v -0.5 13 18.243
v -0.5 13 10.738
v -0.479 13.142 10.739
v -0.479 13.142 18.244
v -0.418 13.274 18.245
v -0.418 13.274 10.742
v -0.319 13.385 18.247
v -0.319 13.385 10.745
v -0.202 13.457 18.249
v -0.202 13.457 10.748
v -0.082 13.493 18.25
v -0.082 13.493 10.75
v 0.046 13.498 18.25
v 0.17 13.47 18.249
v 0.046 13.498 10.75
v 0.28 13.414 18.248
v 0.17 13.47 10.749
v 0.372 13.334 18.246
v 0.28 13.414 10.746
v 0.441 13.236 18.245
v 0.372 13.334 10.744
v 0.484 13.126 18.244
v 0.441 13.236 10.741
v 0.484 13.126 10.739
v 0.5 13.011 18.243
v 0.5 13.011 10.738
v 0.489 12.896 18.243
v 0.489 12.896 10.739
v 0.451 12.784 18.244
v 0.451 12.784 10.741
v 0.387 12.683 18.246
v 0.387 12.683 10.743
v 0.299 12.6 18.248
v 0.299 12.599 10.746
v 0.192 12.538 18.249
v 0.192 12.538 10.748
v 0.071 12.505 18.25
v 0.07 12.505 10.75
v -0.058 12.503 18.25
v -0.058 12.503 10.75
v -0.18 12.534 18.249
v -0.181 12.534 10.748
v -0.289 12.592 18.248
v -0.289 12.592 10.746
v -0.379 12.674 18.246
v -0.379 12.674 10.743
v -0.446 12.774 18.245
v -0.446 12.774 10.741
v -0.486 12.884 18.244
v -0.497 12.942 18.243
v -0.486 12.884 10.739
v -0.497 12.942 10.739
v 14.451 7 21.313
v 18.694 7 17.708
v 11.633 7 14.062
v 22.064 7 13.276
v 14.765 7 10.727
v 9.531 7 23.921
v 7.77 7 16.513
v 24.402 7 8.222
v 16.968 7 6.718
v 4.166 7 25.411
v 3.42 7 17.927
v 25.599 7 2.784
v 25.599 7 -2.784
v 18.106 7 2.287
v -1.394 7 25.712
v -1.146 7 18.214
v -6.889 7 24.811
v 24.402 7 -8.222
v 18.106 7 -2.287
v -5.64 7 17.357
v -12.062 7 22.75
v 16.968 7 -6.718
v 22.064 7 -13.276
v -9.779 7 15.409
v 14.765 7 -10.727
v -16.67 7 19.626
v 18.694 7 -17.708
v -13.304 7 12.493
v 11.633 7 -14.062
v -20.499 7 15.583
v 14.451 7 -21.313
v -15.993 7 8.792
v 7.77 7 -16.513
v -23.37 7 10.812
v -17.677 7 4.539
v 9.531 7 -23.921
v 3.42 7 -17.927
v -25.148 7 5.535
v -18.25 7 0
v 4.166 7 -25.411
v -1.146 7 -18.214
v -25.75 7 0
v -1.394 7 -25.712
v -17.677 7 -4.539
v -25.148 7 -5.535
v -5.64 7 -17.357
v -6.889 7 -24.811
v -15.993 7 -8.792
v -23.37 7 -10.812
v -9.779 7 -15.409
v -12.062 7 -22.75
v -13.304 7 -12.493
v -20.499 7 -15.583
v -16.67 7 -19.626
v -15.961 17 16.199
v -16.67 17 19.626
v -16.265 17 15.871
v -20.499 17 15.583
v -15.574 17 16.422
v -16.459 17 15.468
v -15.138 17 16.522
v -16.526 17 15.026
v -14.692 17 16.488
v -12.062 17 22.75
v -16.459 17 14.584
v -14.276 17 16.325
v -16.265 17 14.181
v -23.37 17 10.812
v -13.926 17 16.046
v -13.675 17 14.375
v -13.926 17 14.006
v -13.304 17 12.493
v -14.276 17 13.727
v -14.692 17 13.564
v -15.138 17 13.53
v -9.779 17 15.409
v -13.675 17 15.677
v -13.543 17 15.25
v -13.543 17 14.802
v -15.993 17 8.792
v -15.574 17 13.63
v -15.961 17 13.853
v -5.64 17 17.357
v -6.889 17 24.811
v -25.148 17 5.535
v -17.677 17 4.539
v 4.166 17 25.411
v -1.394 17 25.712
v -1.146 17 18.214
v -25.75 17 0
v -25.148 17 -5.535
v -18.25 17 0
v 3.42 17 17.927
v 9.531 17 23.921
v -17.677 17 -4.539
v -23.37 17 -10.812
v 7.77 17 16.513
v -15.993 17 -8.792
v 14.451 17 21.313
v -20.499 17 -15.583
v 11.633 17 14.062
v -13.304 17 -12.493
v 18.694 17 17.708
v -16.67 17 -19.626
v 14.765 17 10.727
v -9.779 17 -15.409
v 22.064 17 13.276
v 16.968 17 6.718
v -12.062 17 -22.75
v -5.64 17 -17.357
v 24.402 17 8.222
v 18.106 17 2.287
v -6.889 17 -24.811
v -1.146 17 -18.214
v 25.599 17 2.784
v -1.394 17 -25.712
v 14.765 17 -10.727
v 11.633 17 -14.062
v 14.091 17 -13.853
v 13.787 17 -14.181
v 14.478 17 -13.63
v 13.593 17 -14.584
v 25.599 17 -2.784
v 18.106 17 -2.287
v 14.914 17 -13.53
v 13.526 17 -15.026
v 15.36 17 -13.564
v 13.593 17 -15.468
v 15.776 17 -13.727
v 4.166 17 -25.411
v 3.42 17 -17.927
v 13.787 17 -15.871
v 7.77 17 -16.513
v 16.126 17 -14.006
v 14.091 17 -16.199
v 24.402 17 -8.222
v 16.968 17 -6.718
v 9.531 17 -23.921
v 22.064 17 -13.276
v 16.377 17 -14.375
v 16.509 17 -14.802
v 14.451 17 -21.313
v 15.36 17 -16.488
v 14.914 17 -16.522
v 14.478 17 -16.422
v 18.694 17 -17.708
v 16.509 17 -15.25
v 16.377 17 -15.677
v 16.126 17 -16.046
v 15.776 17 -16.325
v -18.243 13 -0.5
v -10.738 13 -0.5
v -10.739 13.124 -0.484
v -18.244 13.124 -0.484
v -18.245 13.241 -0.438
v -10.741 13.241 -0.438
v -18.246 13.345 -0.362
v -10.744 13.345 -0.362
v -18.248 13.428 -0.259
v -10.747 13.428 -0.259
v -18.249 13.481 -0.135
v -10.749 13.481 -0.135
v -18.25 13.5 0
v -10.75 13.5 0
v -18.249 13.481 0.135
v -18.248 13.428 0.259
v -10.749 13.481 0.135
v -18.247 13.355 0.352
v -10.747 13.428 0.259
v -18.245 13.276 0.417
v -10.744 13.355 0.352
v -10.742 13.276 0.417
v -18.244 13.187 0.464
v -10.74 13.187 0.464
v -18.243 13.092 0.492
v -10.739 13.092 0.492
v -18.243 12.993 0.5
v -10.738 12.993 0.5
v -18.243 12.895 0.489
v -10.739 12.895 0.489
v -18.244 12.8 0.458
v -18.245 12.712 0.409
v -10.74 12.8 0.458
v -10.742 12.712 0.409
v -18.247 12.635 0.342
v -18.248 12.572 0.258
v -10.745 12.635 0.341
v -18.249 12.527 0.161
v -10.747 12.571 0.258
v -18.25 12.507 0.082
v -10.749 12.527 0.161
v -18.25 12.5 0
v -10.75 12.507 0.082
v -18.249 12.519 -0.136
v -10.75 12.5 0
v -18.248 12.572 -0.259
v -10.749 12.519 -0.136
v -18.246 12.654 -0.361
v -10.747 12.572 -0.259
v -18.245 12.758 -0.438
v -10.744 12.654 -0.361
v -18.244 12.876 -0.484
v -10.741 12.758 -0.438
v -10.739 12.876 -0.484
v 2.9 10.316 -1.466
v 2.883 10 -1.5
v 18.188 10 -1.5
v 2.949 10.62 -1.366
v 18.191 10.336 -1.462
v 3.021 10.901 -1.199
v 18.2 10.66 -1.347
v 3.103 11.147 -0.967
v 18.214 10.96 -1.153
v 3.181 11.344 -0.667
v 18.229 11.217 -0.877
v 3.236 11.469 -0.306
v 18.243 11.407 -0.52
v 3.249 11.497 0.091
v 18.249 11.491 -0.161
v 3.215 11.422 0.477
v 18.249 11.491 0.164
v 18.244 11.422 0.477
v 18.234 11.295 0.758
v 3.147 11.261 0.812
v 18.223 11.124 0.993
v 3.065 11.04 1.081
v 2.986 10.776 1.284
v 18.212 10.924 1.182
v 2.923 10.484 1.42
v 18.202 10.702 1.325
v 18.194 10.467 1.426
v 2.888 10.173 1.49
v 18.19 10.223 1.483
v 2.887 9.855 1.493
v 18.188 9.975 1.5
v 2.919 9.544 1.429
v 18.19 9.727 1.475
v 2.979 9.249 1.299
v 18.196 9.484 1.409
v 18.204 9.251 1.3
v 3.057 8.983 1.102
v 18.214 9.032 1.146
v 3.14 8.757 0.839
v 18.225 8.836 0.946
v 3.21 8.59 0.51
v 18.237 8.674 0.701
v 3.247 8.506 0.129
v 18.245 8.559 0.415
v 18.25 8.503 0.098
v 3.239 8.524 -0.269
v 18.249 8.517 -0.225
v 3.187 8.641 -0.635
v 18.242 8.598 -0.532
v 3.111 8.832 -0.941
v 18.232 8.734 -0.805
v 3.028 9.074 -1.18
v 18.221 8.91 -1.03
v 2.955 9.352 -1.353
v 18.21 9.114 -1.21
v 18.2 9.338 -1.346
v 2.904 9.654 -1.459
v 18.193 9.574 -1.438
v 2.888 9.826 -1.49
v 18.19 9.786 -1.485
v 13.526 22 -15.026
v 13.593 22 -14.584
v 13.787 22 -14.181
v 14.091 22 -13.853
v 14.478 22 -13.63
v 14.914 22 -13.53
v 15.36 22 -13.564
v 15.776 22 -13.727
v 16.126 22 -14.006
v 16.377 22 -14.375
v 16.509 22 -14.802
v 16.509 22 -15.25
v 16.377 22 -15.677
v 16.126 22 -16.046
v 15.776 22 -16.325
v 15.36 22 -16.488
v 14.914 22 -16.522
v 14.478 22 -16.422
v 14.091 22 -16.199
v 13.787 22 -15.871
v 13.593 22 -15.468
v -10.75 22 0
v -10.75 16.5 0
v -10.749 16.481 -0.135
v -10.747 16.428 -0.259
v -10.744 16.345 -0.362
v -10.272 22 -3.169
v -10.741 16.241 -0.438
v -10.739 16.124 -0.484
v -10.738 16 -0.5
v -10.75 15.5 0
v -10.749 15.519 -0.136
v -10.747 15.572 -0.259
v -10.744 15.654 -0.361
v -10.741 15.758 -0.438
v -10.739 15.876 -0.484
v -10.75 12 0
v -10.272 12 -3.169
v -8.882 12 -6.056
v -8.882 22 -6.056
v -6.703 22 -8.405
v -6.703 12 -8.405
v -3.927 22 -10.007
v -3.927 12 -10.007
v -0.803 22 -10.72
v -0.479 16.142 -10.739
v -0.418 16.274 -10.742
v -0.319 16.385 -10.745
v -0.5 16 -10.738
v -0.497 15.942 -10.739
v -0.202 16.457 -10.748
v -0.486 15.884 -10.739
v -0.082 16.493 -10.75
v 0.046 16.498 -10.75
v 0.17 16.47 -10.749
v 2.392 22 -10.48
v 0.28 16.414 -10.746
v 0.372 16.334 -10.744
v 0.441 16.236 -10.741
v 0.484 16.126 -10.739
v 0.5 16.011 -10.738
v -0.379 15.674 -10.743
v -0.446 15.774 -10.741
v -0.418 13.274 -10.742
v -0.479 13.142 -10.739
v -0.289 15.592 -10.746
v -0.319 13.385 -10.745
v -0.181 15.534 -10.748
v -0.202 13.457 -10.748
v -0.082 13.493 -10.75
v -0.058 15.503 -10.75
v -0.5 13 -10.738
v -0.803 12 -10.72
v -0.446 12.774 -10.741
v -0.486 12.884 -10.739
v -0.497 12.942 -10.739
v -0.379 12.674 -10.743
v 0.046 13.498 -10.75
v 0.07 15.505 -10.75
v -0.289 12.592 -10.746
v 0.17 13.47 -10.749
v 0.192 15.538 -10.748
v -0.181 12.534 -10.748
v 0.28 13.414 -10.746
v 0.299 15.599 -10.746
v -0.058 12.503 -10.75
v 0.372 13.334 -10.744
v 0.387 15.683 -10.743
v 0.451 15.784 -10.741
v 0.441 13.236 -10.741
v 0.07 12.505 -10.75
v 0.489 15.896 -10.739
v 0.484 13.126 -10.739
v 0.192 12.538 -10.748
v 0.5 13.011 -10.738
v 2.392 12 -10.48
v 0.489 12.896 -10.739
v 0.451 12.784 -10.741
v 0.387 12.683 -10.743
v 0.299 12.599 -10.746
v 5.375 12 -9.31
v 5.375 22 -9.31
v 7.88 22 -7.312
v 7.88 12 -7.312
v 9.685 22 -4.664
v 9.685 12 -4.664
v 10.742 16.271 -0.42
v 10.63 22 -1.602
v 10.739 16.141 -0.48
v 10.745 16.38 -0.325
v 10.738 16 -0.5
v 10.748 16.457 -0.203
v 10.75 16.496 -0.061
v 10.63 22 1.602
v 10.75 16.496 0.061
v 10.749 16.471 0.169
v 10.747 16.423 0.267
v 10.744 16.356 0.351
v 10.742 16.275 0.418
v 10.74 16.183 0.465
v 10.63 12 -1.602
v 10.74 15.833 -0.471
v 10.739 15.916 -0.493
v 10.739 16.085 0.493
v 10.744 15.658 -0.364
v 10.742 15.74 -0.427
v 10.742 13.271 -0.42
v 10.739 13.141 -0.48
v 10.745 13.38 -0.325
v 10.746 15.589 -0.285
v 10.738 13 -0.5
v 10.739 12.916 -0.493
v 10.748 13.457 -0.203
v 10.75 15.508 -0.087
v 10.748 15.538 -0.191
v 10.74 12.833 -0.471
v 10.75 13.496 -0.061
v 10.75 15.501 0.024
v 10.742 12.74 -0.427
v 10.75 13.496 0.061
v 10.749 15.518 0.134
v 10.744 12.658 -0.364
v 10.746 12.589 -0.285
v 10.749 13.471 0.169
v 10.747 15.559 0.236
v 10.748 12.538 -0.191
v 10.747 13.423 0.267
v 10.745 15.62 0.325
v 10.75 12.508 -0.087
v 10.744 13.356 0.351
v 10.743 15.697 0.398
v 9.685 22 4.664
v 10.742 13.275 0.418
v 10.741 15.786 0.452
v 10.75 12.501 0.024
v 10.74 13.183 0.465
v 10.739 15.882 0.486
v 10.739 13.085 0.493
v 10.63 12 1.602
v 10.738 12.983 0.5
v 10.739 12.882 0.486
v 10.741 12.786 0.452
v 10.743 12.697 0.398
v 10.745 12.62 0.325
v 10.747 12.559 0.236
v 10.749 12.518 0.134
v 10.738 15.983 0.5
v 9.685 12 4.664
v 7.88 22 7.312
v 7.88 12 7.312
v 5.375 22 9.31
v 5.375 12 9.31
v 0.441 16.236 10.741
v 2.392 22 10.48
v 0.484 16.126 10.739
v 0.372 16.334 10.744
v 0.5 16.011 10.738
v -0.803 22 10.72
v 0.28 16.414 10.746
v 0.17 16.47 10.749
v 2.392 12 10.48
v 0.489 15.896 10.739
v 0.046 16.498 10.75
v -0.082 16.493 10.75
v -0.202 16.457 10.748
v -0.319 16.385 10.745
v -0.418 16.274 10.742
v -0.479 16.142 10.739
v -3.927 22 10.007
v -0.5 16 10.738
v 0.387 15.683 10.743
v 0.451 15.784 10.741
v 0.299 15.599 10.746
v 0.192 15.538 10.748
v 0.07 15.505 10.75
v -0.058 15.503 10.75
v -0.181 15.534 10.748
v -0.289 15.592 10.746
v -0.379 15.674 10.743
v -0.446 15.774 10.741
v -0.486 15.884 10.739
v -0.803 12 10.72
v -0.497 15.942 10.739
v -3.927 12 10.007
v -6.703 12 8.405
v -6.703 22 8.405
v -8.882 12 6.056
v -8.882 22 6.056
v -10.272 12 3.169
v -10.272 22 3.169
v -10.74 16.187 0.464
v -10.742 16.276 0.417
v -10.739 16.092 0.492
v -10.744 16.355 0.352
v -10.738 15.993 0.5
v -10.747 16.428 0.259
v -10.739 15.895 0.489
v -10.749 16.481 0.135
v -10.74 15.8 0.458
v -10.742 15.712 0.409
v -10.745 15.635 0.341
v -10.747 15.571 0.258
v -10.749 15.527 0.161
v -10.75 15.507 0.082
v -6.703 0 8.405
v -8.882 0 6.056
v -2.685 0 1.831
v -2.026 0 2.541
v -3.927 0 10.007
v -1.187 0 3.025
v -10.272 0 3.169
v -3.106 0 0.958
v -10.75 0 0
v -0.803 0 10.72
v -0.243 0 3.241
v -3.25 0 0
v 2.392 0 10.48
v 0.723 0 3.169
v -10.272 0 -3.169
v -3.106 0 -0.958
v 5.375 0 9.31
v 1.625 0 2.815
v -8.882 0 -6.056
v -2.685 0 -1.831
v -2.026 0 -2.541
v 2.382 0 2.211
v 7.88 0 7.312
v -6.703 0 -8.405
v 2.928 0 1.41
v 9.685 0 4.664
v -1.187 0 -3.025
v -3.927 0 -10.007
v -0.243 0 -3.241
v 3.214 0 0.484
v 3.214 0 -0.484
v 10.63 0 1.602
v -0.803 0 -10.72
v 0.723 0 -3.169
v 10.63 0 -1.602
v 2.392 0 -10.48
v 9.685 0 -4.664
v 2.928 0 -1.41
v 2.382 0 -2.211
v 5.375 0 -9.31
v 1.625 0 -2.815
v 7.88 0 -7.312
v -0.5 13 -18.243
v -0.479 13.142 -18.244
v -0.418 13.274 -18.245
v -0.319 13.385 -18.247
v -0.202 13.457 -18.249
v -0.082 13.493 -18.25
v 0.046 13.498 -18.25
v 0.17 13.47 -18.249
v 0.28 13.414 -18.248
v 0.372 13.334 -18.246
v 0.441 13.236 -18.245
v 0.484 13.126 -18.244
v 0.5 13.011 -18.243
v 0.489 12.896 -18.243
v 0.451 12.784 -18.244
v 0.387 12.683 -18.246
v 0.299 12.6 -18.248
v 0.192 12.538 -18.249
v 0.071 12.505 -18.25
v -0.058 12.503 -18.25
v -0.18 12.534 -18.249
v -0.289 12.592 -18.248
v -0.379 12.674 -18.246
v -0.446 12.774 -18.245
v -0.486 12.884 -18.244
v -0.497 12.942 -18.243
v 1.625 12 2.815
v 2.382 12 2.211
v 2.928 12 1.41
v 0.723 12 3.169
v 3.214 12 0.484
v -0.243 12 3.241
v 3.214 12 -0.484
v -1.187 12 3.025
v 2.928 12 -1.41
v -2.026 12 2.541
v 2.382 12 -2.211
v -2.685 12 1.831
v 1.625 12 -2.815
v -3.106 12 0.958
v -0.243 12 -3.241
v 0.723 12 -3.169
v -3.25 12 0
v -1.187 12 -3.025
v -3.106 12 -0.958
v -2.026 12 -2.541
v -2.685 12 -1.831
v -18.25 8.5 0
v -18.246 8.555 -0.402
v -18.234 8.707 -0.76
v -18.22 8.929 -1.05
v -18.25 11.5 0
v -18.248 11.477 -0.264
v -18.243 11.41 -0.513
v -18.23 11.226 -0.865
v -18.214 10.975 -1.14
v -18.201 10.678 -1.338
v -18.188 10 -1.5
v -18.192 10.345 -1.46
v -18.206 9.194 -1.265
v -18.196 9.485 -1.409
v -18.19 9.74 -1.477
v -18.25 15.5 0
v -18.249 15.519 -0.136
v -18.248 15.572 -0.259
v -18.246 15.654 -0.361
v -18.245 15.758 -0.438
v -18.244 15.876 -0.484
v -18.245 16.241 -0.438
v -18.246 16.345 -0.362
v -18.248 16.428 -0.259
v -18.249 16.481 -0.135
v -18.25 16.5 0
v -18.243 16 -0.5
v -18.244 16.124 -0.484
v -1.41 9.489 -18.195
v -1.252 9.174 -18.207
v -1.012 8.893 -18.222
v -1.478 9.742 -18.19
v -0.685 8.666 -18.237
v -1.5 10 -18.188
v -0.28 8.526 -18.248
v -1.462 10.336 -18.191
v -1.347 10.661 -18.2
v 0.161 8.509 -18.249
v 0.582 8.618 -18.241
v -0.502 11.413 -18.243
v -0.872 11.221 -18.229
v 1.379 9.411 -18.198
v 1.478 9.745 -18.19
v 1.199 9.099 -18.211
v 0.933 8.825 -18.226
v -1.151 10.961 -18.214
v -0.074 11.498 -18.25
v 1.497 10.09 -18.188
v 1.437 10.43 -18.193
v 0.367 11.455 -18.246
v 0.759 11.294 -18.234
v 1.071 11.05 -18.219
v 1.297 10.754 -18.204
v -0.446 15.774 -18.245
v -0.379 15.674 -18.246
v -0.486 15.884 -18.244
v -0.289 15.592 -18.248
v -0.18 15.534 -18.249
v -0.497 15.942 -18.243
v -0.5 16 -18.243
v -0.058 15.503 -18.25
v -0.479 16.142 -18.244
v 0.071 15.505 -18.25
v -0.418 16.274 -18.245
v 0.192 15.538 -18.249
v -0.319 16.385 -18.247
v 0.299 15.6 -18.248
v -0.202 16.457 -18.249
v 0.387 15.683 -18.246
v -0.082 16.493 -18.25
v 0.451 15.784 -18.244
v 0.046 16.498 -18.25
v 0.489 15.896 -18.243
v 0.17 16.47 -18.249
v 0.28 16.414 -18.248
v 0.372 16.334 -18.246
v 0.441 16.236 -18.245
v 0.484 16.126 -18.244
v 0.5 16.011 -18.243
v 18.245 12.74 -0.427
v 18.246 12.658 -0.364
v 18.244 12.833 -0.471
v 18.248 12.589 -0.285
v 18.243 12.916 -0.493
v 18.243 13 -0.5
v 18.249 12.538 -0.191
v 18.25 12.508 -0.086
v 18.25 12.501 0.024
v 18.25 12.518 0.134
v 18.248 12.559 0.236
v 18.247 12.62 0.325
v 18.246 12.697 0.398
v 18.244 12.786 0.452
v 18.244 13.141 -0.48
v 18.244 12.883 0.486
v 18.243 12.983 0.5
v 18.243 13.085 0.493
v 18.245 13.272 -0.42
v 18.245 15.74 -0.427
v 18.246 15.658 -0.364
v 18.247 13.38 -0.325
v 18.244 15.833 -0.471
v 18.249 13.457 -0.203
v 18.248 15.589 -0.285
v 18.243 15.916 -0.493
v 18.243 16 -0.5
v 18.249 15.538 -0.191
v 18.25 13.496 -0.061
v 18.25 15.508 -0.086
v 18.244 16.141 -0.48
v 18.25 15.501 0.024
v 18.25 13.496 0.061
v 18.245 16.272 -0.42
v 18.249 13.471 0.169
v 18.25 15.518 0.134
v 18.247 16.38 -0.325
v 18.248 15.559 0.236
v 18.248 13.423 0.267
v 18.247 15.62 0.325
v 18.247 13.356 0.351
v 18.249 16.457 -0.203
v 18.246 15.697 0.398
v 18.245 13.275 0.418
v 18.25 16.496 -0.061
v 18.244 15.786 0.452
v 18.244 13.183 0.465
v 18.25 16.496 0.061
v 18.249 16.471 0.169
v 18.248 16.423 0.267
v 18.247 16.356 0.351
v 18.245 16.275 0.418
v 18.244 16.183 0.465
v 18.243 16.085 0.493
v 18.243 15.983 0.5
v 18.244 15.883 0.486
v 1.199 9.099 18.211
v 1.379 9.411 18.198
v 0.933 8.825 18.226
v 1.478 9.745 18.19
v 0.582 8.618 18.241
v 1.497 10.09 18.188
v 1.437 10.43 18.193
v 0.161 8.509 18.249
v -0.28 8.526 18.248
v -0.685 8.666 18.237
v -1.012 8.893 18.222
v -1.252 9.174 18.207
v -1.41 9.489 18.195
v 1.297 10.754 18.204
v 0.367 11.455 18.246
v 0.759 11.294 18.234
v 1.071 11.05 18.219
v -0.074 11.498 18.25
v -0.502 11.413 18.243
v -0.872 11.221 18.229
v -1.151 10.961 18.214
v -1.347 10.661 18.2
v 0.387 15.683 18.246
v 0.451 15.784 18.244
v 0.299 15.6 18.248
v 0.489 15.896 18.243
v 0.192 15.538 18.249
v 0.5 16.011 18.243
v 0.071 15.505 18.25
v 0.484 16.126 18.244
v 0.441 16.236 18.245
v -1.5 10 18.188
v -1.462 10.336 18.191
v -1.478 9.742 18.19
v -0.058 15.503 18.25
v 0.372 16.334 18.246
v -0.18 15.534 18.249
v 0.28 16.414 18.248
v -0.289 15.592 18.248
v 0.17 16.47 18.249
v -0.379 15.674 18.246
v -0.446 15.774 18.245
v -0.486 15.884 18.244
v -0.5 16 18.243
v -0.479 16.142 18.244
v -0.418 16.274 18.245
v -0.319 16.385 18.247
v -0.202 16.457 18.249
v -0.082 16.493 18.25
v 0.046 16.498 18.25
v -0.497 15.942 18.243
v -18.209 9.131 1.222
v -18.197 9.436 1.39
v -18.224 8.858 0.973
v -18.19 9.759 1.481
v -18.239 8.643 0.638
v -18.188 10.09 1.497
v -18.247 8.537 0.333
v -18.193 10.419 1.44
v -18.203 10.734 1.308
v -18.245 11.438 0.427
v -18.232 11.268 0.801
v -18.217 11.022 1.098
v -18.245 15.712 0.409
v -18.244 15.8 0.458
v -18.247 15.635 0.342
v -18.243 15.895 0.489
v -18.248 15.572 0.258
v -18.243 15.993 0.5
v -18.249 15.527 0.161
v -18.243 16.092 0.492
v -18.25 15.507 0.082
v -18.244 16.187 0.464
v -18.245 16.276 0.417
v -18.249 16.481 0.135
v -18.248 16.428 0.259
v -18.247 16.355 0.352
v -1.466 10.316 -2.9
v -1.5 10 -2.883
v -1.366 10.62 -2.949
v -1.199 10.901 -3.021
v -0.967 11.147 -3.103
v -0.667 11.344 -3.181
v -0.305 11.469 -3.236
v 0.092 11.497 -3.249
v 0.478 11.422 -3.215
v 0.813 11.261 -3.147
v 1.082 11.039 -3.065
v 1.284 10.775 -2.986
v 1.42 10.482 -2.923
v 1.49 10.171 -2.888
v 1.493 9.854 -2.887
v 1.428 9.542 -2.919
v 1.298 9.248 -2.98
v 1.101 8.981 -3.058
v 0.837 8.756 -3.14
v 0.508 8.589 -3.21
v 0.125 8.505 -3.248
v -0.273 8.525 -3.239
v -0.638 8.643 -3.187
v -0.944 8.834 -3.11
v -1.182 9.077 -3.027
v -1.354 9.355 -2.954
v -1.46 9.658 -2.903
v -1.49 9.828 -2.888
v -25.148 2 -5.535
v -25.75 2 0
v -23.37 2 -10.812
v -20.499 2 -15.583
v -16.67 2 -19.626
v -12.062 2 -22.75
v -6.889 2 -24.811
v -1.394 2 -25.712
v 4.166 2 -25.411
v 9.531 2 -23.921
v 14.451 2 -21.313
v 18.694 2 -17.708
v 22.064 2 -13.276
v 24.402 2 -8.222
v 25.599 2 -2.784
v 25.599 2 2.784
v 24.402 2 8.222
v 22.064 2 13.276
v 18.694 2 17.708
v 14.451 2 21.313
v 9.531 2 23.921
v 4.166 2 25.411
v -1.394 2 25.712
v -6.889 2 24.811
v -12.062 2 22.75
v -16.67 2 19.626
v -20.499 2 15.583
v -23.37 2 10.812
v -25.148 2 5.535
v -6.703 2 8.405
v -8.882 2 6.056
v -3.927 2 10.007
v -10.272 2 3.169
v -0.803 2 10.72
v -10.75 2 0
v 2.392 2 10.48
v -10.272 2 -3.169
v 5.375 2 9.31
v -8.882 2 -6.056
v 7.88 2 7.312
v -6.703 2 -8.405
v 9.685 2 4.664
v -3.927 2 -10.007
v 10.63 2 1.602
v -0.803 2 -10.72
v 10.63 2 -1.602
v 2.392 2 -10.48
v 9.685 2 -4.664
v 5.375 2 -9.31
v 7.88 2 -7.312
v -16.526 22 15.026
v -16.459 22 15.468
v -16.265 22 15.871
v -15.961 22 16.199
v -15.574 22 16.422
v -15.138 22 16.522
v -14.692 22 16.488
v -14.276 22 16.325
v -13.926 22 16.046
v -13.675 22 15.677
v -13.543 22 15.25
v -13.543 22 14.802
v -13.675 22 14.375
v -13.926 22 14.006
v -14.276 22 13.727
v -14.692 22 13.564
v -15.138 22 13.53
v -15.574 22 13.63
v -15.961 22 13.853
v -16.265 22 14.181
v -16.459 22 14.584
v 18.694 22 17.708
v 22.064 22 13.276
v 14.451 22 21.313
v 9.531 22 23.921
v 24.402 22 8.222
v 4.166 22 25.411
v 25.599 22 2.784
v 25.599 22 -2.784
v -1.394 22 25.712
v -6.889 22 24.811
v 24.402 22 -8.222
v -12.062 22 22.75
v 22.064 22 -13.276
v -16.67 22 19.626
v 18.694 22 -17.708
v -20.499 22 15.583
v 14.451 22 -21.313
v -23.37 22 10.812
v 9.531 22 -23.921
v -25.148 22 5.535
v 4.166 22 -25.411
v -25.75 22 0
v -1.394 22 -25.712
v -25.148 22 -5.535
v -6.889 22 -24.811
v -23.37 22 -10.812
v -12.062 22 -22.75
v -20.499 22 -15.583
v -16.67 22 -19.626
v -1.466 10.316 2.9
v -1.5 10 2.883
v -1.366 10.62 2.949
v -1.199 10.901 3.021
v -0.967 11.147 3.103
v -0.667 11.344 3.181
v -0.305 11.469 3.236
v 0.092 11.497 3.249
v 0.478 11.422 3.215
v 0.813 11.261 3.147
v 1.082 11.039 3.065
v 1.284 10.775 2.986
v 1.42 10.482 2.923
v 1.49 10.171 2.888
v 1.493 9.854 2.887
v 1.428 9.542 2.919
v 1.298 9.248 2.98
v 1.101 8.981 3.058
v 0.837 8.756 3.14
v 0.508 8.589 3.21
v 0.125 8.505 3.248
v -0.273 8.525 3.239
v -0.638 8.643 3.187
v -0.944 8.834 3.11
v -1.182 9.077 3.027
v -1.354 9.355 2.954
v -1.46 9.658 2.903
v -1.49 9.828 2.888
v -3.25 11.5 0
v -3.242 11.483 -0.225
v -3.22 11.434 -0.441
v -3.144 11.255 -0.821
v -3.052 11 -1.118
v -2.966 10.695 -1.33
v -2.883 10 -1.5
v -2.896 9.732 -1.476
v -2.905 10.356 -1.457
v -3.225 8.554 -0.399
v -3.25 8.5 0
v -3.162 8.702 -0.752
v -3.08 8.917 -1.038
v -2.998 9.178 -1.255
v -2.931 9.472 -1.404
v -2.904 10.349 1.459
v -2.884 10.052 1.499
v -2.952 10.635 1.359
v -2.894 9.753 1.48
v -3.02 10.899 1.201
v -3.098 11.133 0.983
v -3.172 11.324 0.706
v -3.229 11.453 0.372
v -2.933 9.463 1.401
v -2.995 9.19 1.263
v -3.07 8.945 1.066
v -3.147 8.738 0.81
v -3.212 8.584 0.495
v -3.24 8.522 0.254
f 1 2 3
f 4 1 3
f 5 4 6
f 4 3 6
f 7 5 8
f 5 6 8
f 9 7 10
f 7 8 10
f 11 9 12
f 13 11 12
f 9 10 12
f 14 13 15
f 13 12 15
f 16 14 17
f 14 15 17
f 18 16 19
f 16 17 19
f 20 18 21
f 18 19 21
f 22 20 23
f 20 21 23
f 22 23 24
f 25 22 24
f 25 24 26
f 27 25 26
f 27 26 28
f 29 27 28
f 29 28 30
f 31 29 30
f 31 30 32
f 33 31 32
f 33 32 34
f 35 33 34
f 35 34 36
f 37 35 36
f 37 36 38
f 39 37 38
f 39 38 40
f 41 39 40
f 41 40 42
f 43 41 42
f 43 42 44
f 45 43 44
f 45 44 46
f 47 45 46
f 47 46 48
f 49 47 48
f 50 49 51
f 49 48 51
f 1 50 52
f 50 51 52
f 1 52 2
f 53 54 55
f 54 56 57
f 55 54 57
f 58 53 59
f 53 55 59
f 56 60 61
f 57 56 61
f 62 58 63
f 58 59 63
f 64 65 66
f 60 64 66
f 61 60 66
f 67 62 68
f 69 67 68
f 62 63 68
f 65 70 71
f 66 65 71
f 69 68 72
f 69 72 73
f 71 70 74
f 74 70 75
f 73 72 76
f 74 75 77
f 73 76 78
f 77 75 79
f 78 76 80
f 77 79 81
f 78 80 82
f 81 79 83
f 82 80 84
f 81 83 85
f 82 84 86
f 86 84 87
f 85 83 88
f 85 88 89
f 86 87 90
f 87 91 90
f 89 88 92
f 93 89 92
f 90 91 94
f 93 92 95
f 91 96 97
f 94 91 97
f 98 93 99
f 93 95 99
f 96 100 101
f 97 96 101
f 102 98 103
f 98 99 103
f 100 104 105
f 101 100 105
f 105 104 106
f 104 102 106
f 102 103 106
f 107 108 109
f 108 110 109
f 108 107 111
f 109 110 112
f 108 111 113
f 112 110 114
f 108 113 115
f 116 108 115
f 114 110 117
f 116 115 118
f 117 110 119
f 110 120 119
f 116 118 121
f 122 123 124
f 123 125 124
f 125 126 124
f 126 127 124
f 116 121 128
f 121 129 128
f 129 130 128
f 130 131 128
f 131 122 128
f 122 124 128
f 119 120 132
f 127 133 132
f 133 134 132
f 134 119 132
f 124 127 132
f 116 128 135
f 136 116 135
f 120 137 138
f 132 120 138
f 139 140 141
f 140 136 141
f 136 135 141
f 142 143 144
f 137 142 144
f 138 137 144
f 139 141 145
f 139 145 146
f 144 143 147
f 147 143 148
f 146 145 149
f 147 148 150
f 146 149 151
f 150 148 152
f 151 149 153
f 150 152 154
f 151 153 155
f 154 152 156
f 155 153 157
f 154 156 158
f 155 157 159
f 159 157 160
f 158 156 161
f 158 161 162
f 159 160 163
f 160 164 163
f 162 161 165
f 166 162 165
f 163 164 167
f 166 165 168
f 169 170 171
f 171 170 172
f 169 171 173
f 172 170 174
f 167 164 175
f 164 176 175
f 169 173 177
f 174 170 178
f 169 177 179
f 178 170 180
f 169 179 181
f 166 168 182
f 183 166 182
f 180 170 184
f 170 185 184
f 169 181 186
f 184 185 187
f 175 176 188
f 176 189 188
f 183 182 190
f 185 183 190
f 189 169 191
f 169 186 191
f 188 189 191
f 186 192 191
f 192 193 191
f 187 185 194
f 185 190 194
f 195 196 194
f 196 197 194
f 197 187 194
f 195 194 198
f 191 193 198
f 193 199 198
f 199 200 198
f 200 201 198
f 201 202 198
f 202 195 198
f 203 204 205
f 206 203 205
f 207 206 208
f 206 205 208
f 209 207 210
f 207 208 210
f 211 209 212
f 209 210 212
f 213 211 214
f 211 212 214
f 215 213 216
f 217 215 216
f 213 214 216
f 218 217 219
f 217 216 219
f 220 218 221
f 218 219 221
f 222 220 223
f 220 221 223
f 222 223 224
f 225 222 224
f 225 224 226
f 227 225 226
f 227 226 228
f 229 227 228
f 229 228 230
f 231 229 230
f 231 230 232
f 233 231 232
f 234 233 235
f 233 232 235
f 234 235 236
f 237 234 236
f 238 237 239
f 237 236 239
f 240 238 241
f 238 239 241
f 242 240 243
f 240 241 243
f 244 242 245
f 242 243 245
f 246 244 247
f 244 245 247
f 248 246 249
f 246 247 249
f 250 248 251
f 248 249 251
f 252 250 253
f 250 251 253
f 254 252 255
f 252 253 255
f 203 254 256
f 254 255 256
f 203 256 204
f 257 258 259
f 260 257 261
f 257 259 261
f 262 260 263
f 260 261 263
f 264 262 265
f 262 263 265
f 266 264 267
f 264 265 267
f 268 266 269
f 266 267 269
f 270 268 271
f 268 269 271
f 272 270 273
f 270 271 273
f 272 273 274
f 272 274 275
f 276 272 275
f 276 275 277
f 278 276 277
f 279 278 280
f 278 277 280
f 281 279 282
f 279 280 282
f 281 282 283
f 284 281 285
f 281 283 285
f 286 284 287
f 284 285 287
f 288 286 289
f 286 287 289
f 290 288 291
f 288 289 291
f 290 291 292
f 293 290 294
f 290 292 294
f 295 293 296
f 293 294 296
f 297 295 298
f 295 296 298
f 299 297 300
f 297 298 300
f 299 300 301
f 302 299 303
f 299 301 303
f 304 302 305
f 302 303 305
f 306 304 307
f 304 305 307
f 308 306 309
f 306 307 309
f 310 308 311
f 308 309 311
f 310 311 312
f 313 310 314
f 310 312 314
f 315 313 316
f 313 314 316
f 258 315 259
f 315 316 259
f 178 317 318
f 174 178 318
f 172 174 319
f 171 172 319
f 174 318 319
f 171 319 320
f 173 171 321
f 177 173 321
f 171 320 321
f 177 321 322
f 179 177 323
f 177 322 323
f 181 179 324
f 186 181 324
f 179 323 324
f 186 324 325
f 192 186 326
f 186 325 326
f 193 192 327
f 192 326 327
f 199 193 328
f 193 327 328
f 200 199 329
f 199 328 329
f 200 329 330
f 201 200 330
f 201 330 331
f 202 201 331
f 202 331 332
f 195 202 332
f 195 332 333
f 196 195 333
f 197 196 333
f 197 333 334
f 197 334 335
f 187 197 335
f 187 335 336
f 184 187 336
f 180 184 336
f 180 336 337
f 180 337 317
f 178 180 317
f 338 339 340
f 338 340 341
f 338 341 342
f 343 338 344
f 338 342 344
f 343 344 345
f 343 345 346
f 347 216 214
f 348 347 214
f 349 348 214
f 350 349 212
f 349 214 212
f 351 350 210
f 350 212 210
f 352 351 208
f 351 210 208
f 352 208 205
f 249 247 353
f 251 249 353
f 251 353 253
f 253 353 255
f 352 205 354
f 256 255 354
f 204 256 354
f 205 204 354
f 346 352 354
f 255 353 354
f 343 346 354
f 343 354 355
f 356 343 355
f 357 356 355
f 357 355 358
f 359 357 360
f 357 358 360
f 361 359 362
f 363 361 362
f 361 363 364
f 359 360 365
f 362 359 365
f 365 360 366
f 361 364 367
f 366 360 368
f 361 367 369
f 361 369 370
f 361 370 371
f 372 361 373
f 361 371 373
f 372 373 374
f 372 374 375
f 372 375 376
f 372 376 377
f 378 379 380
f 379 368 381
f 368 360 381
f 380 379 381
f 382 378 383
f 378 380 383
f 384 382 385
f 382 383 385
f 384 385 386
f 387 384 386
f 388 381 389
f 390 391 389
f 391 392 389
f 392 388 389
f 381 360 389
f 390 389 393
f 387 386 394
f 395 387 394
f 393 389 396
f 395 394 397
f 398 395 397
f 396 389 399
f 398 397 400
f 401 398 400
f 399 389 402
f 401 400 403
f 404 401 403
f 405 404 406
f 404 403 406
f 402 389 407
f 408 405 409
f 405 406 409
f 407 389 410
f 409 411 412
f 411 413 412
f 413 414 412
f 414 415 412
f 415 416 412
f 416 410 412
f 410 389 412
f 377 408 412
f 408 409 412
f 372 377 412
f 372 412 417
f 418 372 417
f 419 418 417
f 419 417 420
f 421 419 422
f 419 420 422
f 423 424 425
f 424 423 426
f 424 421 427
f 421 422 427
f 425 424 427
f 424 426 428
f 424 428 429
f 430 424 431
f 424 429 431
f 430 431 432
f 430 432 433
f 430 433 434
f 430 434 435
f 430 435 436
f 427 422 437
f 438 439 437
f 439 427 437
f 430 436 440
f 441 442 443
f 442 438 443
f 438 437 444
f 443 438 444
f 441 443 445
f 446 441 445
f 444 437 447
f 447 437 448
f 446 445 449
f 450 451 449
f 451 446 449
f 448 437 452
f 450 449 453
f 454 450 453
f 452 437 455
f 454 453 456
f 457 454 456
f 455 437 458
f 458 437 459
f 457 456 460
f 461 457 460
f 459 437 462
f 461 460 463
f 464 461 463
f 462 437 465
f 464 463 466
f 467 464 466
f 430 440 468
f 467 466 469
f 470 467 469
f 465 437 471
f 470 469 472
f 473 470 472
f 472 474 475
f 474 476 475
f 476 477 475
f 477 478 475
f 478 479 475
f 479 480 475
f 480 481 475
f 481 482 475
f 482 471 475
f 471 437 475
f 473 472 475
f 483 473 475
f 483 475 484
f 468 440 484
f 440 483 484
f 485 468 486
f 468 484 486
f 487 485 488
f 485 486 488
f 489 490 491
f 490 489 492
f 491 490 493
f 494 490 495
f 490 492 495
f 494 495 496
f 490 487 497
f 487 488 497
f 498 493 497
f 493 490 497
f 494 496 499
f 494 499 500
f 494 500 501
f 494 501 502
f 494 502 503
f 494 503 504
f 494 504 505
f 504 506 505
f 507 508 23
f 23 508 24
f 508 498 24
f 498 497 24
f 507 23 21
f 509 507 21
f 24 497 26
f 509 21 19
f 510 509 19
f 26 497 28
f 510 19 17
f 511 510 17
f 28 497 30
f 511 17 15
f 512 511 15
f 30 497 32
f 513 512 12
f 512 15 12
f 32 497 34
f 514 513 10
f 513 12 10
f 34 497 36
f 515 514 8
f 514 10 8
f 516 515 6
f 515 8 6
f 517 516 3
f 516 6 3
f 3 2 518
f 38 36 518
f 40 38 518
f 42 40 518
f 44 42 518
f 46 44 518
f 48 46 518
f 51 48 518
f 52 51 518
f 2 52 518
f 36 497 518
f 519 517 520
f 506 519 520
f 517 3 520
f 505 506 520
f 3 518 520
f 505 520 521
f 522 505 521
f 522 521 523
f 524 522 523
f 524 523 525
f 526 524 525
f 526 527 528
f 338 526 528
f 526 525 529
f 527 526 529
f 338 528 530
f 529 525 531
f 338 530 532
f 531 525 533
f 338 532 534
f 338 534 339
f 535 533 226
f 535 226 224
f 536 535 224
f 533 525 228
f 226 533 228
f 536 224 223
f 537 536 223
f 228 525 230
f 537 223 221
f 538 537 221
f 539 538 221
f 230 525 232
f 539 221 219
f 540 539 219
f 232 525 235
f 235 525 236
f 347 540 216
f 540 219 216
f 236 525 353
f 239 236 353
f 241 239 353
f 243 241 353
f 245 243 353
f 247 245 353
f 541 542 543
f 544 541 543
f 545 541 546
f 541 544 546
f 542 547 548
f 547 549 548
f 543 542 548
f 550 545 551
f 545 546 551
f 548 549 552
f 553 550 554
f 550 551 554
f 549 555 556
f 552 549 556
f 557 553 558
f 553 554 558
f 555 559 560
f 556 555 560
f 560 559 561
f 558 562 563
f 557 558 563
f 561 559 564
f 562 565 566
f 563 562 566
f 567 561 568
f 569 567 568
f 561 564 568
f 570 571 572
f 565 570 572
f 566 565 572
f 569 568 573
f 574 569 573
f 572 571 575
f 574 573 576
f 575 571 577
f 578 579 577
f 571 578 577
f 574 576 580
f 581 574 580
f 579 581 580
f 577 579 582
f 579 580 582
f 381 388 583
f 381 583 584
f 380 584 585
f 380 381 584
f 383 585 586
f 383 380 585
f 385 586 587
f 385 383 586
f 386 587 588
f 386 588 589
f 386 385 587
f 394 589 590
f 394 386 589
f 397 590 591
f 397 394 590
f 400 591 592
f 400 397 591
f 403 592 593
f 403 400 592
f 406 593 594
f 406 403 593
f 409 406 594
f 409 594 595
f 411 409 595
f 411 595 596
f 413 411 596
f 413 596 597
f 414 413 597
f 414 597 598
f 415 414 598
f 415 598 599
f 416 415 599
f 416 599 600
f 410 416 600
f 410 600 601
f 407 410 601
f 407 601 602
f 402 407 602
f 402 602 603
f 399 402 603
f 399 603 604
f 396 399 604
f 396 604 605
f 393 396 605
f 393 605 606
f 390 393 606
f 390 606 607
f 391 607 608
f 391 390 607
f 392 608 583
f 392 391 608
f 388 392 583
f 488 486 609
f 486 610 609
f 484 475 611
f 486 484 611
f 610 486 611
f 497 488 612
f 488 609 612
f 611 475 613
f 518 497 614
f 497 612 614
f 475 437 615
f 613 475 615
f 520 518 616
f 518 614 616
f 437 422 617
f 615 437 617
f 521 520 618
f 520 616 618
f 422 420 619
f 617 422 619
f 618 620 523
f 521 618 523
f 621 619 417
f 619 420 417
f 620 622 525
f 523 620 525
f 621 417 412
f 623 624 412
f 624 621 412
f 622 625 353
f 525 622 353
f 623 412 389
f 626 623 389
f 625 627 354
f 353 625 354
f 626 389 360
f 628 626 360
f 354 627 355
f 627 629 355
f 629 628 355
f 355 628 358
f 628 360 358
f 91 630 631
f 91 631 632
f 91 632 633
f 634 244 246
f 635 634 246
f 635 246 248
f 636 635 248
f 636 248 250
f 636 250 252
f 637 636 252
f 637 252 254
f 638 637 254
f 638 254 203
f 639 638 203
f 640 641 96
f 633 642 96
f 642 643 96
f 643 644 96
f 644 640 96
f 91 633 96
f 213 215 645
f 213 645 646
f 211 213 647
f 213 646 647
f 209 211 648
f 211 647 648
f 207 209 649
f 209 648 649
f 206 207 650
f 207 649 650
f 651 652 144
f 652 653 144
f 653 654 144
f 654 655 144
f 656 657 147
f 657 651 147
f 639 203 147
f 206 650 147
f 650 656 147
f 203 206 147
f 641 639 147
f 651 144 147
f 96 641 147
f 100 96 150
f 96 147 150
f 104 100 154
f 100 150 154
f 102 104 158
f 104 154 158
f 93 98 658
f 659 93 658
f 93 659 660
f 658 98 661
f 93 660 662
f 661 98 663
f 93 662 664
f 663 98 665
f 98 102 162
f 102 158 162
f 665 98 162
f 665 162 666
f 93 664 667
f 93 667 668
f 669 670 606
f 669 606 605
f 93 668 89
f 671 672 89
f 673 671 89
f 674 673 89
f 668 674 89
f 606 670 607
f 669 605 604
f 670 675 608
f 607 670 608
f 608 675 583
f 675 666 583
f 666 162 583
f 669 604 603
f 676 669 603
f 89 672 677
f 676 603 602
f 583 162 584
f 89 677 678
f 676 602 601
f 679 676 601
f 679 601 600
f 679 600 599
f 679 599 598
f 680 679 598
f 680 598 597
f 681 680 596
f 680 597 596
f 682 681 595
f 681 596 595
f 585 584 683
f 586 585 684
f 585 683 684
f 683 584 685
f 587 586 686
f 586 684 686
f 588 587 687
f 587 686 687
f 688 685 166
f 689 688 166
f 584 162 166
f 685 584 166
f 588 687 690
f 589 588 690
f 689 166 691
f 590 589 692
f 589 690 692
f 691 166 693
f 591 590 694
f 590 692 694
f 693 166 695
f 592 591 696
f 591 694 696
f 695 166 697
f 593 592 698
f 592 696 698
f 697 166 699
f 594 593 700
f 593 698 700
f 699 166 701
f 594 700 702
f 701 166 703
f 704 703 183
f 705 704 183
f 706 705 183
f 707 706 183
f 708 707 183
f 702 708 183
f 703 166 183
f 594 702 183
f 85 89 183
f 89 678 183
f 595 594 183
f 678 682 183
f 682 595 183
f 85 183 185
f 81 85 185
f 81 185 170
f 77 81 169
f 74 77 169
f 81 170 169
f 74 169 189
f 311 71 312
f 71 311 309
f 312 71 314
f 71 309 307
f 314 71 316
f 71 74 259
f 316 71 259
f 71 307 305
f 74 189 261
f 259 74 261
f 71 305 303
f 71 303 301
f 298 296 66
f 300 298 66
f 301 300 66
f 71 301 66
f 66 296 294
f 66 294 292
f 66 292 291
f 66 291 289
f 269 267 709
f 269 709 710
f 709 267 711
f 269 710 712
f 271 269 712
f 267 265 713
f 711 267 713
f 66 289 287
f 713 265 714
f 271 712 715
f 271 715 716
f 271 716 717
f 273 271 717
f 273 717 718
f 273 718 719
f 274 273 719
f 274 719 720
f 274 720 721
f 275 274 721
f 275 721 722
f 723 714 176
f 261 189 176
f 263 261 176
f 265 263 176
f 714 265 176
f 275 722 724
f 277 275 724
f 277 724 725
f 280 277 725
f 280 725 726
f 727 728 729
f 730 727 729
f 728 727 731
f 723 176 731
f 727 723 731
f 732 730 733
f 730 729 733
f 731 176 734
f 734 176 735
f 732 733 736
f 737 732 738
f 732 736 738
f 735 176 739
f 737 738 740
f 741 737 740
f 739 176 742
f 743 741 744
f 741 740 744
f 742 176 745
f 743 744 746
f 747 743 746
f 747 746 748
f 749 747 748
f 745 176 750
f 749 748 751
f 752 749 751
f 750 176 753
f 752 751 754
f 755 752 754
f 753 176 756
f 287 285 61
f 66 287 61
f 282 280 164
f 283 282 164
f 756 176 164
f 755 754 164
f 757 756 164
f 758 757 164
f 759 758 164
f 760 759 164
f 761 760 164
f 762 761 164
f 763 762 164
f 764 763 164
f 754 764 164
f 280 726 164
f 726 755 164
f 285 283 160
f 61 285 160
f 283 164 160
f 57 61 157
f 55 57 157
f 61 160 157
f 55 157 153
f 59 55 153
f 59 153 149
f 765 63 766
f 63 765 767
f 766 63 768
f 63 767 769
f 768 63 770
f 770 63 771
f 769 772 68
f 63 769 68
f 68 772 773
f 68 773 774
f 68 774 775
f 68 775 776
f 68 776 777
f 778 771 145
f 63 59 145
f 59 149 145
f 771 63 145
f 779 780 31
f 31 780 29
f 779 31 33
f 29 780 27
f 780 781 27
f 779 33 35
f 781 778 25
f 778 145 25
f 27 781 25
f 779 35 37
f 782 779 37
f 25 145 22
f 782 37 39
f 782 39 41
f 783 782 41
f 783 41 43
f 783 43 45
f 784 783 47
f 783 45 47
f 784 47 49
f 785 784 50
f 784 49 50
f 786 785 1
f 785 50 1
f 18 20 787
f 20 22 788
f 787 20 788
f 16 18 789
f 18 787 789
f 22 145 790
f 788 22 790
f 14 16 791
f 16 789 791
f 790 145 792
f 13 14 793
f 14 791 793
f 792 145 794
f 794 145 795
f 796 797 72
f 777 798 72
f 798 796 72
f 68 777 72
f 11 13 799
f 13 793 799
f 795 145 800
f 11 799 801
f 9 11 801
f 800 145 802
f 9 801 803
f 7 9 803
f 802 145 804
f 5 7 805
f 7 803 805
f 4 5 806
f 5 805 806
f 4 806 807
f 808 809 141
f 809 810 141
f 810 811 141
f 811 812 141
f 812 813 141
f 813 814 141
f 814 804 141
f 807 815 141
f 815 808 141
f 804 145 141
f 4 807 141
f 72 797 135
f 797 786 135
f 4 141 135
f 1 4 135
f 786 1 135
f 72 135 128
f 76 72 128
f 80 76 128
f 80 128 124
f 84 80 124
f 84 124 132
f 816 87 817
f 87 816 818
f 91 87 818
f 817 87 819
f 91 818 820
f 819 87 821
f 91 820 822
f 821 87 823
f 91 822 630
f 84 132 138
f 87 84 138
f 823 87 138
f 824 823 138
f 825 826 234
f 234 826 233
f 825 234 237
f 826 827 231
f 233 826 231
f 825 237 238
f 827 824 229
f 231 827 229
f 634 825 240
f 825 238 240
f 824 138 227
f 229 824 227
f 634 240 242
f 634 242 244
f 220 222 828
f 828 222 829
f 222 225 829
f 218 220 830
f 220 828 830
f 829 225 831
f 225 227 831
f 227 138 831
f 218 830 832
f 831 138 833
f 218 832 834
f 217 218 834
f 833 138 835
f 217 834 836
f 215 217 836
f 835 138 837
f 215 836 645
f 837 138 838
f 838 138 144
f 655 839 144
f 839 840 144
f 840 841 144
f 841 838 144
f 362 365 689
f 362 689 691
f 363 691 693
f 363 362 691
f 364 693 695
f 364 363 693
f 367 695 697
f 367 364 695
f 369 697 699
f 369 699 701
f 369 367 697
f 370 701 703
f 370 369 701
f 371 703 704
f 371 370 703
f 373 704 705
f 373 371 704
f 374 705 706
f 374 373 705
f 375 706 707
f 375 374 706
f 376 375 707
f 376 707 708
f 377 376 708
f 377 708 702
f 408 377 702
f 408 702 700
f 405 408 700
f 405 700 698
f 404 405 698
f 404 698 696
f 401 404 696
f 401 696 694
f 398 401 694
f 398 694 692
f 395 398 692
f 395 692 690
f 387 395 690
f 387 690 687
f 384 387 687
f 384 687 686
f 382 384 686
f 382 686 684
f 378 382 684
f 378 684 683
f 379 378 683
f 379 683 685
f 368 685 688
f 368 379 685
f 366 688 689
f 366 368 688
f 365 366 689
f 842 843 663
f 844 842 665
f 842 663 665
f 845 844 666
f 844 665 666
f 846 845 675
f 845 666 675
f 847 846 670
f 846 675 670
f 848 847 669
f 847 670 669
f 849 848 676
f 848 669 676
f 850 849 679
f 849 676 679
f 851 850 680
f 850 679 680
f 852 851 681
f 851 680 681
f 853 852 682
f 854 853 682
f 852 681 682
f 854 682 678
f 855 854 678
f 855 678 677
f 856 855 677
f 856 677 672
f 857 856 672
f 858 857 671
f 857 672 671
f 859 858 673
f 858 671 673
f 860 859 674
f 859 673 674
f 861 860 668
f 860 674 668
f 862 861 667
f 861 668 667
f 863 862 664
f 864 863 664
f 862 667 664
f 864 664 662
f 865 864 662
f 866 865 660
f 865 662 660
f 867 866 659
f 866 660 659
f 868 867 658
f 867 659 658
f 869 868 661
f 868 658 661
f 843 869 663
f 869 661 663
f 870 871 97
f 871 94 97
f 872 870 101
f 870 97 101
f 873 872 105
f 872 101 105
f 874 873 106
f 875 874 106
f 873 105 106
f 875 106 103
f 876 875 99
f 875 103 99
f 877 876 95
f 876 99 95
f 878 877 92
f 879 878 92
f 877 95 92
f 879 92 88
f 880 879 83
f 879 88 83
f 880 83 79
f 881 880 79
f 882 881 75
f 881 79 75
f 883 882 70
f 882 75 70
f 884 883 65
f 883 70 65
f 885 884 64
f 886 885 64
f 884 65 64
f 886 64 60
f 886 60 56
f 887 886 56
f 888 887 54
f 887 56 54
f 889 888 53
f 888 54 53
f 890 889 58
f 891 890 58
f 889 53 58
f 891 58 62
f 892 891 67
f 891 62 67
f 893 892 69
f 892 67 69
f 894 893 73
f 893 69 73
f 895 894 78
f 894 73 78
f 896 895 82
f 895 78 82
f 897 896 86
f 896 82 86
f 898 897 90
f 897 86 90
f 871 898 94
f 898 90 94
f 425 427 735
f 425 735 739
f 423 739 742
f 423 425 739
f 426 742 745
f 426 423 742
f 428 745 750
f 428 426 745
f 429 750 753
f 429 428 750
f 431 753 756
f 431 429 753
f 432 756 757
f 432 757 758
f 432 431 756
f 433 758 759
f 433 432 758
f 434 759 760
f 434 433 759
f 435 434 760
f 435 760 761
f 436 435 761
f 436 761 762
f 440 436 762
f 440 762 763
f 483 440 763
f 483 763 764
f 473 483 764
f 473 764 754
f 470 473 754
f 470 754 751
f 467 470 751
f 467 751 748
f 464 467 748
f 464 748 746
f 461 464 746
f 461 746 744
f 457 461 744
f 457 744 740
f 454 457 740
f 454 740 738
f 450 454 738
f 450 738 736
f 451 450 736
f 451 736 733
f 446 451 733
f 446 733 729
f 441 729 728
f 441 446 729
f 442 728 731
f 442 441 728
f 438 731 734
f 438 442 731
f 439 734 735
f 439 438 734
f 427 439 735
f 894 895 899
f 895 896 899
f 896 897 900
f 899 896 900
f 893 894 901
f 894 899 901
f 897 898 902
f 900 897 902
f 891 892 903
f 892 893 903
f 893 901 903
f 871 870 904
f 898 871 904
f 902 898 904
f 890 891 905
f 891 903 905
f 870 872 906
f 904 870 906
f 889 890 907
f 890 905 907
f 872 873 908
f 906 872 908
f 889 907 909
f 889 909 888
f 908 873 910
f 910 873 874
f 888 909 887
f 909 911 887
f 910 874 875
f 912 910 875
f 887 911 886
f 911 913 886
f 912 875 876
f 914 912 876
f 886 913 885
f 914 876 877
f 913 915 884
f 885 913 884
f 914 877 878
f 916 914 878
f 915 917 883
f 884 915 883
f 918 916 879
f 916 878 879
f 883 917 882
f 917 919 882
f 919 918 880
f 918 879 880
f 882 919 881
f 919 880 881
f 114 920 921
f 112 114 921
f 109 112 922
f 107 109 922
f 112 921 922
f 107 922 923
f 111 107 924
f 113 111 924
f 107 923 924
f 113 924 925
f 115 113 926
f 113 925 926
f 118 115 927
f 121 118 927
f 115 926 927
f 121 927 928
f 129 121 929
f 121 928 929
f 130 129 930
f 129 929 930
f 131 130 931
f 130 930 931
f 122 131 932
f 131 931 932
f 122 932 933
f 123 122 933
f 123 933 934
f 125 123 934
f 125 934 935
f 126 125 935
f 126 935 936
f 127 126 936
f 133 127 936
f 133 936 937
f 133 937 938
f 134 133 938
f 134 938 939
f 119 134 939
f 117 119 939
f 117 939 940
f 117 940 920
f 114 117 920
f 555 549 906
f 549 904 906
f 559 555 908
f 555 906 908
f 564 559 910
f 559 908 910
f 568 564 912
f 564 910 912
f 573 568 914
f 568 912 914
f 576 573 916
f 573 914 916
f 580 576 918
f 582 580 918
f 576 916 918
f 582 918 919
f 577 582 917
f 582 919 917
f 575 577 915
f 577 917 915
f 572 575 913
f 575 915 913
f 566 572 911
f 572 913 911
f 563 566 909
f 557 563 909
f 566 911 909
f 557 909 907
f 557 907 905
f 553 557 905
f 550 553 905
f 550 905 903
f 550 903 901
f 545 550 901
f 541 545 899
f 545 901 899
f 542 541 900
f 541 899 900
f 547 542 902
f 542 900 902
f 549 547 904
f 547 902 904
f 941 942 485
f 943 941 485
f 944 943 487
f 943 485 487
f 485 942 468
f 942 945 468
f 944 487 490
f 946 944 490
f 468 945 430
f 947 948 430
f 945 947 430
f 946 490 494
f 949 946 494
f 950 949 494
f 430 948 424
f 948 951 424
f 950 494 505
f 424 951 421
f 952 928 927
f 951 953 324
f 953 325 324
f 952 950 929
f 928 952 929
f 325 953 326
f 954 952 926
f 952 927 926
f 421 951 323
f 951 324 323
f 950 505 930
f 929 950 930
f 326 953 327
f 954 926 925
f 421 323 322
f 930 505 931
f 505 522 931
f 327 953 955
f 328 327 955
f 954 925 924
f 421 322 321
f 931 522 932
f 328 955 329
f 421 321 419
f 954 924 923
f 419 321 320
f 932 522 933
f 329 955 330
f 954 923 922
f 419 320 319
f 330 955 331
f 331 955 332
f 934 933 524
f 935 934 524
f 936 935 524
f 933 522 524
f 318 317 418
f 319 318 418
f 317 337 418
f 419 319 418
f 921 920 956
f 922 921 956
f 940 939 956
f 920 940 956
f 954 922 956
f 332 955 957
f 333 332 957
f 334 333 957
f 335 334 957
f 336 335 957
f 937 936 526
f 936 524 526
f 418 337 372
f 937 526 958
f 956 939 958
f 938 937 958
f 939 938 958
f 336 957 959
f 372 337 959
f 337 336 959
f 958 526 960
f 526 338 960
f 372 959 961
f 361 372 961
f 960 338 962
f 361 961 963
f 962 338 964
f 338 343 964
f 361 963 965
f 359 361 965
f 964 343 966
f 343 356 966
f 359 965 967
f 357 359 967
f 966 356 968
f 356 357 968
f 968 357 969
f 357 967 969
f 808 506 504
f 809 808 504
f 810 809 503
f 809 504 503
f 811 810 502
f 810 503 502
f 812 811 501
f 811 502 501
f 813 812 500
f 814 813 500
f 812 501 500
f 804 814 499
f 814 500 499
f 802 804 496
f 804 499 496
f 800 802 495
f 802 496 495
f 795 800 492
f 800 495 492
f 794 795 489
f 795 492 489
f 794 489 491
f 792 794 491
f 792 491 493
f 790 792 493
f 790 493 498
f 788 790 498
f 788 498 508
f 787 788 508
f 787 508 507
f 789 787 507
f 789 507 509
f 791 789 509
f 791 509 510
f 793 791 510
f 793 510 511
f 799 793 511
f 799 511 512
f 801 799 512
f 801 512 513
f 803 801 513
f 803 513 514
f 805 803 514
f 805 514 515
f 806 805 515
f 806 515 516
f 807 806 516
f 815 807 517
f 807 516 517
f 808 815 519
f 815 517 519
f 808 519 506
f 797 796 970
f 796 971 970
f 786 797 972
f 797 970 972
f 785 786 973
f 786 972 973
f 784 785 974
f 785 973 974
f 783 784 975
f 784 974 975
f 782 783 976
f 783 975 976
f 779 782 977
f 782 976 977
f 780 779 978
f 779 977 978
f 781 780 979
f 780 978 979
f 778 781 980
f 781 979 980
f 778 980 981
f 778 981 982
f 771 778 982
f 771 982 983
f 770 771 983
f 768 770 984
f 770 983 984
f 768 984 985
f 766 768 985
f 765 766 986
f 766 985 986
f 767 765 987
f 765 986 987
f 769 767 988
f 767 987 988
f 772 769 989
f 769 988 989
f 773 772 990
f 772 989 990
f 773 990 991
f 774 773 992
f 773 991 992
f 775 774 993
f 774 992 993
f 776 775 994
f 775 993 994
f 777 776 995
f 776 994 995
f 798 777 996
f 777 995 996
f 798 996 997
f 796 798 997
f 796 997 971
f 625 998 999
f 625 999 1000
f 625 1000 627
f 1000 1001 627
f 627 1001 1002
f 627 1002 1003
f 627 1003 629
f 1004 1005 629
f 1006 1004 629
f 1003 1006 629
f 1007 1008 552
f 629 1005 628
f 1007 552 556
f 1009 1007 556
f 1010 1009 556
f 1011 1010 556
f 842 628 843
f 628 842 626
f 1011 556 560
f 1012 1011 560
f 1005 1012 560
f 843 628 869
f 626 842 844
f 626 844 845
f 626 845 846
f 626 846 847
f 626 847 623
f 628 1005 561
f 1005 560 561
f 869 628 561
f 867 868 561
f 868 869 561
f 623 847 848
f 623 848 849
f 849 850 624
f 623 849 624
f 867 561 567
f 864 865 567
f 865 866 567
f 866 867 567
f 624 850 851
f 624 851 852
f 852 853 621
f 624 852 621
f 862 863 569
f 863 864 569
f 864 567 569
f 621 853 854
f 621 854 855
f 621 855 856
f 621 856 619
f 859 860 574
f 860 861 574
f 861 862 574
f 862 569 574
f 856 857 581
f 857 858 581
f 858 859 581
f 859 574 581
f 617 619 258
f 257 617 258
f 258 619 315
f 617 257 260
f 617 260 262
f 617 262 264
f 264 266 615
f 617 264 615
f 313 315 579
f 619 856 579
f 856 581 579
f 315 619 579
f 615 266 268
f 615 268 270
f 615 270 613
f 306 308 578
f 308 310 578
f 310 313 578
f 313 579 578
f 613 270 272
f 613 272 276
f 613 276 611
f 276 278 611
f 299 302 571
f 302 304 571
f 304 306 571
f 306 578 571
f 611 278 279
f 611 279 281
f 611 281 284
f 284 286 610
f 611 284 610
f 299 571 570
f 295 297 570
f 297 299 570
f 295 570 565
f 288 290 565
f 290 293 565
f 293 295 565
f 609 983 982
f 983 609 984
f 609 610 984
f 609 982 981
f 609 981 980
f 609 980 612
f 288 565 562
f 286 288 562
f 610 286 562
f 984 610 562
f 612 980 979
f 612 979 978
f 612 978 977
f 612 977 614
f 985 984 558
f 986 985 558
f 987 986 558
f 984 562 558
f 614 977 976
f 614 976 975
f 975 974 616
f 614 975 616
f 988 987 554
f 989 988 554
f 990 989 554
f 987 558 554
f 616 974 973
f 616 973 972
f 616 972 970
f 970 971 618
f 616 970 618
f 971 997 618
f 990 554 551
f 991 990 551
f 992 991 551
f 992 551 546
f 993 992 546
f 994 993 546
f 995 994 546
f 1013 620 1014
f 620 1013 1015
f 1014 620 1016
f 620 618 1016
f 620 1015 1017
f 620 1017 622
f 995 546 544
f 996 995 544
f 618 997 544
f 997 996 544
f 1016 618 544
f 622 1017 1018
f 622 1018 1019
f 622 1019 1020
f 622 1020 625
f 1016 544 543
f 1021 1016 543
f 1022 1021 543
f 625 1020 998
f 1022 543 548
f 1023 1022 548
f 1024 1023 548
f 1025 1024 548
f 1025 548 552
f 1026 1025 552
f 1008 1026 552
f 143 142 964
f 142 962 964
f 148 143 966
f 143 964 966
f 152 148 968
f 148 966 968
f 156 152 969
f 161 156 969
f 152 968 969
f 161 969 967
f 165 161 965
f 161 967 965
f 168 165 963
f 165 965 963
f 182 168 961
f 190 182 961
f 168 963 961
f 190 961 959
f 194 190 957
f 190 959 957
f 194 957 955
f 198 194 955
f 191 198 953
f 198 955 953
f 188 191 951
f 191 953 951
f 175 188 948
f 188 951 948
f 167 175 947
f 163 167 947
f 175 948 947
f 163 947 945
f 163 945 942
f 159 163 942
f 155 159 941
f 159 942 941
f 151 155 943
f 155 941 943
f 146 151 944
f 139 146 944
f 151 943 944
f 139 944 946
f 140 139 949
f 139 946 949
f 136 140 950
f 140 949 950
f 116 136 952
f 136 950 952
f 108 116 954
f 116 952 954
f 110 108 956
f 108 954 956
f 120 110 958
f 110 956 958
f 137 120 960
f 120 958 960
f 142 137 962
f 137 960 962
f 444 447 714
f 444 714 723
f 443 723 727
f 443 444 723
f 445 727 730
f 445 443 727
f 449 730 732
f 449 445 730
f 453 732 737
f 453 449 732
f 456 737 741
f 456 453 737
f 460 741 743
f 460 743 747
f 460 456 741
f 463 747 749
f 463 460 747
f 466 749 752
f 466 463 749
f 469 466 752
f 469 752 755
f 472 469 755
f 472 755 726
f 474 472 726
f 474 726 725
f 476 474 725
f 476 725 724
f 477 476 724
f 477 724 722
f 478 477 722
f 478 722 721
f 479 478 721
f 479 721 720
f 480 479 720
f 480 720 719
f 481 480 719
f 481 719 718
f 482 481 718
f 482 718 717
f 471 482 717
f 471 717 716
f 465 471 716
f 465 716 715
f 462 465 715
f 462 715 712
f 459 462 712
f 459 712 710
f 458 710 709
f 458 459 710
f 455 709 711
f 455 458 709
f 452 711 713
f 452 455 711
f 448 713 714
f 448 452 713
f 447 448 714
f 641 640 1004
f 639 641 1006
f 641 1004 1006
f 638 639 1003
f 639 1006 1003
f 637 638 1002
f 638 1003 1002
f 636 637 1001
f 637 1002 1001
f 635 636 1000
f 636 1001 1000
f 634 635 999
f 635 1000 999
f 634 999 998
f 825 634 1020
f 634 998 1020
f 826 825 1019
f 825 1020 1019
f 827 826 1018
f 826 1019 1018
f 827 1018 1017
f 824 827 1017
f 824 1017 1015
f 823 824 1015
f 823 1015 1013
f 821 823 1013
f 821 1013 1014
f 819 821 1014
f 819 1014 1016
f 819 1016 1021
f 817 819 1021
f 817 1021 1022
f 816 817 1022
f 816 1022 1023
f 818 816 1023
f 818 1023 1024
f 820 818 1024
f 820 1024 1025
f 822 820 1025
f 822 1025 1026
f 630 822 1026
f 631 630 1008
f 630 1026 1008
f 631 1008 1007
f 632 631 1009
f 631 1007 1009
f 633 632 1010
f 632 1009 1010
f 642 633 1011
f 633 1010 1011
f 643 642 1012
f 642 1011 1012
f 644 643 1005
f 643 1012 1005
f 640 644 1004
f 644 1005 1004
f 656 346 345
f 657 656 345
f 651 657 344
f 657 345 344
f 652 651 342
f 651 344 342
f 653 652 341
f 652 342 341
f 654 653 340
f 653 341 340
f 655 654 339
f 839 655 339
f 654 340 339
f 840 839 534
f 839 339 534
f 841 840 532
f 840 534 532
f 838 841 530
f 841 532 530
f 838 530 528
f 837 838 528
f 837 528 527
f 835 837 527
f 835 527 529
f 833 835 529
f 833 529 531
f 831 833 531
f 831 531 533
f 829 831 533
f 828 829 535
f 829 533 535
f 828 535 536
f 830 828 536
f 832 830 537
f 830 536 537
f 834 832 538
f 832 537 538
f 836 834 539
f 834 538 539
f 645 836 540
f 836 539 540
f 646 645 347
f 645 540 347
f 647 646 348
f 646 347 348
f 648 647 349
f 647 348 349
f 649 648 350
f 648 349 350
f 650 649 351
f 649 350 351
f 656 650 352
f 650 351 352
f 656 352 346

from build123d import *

# Parameters (mm, degrees)
SKETCH3_R          = 0.5
SKETCH3_R_2        = 1.5
CUT_EXTRUDE1_DEPTH = 43.545563811
CIRPATTERN1_COUNT  = 2
CIRPATTERN1_ANGLE  = 90
SKETCH4_R          = 1.5
CUT_EXTRUDE2_DEPTH = 13


with BuildPart() as part:
    # Sketch2 → Revolve1 (revolve)
    with BuildSketch(Plane.XY, mode=Mode.PRIVATE) as revolve1_sk:
        Polygon((3.25, 0), (10.75, 0), (10.75, 2), (25.75, 2), (25.75, 7), (18.25, 7), (18.25, 17), (25.75, 17), (25.75, 22), (10.75, 22), (10.75, 12), (3.25, 12), align=None)
    revolve(revolve1_sk.sketch.rotate(Axis((0, 87.545500491, 0), (0, -1, 0)), 180), axis=Axis((0, 87.545500491, 0), (0, -1, 0)))

    # Sketch3 → Cut-Extrude1 (cut, symmetric)
    with BuildSketch(Plane(origin=(0, 0, 0), x_dir=(0, 0, -1), z_dir=(1, 0, 0))):
        with Locations((0, 13)):
            Circle(SKETCH3_R)
        with Locations((0, 16)):
            Circle(SKETCH3_R)
        with Locations((0, 10)):
            Circle(SKETCH3_R_2)
    cut_extrude1 = extrude(amount=CUT_EXTRUDE1_DEPTH, both=True, mode=Mode.SUBTRACT)

    # CirPattern1: Cut-Extrude1 ×2 about axis
    cirpattern1_axis = Axis((0, 22, 0), (0, 1, 0))
    for i in range(1, CIRPATTERN1_COUNT):
        add(cut_extrude1.rotate(cirpattern1_axis, i * CIRPATTERN1_ANGLE / (CIRPATTERN1_COUNT - 1)), mode=Mode.SUBTRACT)

    # Sketch4 → Cut-Extrude2 (cut)
    with BuildSketch(Plane(origin=(0, 22, 0), x_dir=(1, 0, 0), z_dir=(0, 1, 0))):
        with Locations(Location((15.0260191, 15.0260191, 0), (0, 0, 180))):
            Circle(SKETCH4_R)
        with Locations(Location((-15.0260191, -15.0260191, 0), (0, 0, 180))):
            Circle(SKETCH4_R)
    extrude(amount=-CUT_EXTRUDE2_DEPTH, mode=Mode.SUBTRACT)


solid = part.part
